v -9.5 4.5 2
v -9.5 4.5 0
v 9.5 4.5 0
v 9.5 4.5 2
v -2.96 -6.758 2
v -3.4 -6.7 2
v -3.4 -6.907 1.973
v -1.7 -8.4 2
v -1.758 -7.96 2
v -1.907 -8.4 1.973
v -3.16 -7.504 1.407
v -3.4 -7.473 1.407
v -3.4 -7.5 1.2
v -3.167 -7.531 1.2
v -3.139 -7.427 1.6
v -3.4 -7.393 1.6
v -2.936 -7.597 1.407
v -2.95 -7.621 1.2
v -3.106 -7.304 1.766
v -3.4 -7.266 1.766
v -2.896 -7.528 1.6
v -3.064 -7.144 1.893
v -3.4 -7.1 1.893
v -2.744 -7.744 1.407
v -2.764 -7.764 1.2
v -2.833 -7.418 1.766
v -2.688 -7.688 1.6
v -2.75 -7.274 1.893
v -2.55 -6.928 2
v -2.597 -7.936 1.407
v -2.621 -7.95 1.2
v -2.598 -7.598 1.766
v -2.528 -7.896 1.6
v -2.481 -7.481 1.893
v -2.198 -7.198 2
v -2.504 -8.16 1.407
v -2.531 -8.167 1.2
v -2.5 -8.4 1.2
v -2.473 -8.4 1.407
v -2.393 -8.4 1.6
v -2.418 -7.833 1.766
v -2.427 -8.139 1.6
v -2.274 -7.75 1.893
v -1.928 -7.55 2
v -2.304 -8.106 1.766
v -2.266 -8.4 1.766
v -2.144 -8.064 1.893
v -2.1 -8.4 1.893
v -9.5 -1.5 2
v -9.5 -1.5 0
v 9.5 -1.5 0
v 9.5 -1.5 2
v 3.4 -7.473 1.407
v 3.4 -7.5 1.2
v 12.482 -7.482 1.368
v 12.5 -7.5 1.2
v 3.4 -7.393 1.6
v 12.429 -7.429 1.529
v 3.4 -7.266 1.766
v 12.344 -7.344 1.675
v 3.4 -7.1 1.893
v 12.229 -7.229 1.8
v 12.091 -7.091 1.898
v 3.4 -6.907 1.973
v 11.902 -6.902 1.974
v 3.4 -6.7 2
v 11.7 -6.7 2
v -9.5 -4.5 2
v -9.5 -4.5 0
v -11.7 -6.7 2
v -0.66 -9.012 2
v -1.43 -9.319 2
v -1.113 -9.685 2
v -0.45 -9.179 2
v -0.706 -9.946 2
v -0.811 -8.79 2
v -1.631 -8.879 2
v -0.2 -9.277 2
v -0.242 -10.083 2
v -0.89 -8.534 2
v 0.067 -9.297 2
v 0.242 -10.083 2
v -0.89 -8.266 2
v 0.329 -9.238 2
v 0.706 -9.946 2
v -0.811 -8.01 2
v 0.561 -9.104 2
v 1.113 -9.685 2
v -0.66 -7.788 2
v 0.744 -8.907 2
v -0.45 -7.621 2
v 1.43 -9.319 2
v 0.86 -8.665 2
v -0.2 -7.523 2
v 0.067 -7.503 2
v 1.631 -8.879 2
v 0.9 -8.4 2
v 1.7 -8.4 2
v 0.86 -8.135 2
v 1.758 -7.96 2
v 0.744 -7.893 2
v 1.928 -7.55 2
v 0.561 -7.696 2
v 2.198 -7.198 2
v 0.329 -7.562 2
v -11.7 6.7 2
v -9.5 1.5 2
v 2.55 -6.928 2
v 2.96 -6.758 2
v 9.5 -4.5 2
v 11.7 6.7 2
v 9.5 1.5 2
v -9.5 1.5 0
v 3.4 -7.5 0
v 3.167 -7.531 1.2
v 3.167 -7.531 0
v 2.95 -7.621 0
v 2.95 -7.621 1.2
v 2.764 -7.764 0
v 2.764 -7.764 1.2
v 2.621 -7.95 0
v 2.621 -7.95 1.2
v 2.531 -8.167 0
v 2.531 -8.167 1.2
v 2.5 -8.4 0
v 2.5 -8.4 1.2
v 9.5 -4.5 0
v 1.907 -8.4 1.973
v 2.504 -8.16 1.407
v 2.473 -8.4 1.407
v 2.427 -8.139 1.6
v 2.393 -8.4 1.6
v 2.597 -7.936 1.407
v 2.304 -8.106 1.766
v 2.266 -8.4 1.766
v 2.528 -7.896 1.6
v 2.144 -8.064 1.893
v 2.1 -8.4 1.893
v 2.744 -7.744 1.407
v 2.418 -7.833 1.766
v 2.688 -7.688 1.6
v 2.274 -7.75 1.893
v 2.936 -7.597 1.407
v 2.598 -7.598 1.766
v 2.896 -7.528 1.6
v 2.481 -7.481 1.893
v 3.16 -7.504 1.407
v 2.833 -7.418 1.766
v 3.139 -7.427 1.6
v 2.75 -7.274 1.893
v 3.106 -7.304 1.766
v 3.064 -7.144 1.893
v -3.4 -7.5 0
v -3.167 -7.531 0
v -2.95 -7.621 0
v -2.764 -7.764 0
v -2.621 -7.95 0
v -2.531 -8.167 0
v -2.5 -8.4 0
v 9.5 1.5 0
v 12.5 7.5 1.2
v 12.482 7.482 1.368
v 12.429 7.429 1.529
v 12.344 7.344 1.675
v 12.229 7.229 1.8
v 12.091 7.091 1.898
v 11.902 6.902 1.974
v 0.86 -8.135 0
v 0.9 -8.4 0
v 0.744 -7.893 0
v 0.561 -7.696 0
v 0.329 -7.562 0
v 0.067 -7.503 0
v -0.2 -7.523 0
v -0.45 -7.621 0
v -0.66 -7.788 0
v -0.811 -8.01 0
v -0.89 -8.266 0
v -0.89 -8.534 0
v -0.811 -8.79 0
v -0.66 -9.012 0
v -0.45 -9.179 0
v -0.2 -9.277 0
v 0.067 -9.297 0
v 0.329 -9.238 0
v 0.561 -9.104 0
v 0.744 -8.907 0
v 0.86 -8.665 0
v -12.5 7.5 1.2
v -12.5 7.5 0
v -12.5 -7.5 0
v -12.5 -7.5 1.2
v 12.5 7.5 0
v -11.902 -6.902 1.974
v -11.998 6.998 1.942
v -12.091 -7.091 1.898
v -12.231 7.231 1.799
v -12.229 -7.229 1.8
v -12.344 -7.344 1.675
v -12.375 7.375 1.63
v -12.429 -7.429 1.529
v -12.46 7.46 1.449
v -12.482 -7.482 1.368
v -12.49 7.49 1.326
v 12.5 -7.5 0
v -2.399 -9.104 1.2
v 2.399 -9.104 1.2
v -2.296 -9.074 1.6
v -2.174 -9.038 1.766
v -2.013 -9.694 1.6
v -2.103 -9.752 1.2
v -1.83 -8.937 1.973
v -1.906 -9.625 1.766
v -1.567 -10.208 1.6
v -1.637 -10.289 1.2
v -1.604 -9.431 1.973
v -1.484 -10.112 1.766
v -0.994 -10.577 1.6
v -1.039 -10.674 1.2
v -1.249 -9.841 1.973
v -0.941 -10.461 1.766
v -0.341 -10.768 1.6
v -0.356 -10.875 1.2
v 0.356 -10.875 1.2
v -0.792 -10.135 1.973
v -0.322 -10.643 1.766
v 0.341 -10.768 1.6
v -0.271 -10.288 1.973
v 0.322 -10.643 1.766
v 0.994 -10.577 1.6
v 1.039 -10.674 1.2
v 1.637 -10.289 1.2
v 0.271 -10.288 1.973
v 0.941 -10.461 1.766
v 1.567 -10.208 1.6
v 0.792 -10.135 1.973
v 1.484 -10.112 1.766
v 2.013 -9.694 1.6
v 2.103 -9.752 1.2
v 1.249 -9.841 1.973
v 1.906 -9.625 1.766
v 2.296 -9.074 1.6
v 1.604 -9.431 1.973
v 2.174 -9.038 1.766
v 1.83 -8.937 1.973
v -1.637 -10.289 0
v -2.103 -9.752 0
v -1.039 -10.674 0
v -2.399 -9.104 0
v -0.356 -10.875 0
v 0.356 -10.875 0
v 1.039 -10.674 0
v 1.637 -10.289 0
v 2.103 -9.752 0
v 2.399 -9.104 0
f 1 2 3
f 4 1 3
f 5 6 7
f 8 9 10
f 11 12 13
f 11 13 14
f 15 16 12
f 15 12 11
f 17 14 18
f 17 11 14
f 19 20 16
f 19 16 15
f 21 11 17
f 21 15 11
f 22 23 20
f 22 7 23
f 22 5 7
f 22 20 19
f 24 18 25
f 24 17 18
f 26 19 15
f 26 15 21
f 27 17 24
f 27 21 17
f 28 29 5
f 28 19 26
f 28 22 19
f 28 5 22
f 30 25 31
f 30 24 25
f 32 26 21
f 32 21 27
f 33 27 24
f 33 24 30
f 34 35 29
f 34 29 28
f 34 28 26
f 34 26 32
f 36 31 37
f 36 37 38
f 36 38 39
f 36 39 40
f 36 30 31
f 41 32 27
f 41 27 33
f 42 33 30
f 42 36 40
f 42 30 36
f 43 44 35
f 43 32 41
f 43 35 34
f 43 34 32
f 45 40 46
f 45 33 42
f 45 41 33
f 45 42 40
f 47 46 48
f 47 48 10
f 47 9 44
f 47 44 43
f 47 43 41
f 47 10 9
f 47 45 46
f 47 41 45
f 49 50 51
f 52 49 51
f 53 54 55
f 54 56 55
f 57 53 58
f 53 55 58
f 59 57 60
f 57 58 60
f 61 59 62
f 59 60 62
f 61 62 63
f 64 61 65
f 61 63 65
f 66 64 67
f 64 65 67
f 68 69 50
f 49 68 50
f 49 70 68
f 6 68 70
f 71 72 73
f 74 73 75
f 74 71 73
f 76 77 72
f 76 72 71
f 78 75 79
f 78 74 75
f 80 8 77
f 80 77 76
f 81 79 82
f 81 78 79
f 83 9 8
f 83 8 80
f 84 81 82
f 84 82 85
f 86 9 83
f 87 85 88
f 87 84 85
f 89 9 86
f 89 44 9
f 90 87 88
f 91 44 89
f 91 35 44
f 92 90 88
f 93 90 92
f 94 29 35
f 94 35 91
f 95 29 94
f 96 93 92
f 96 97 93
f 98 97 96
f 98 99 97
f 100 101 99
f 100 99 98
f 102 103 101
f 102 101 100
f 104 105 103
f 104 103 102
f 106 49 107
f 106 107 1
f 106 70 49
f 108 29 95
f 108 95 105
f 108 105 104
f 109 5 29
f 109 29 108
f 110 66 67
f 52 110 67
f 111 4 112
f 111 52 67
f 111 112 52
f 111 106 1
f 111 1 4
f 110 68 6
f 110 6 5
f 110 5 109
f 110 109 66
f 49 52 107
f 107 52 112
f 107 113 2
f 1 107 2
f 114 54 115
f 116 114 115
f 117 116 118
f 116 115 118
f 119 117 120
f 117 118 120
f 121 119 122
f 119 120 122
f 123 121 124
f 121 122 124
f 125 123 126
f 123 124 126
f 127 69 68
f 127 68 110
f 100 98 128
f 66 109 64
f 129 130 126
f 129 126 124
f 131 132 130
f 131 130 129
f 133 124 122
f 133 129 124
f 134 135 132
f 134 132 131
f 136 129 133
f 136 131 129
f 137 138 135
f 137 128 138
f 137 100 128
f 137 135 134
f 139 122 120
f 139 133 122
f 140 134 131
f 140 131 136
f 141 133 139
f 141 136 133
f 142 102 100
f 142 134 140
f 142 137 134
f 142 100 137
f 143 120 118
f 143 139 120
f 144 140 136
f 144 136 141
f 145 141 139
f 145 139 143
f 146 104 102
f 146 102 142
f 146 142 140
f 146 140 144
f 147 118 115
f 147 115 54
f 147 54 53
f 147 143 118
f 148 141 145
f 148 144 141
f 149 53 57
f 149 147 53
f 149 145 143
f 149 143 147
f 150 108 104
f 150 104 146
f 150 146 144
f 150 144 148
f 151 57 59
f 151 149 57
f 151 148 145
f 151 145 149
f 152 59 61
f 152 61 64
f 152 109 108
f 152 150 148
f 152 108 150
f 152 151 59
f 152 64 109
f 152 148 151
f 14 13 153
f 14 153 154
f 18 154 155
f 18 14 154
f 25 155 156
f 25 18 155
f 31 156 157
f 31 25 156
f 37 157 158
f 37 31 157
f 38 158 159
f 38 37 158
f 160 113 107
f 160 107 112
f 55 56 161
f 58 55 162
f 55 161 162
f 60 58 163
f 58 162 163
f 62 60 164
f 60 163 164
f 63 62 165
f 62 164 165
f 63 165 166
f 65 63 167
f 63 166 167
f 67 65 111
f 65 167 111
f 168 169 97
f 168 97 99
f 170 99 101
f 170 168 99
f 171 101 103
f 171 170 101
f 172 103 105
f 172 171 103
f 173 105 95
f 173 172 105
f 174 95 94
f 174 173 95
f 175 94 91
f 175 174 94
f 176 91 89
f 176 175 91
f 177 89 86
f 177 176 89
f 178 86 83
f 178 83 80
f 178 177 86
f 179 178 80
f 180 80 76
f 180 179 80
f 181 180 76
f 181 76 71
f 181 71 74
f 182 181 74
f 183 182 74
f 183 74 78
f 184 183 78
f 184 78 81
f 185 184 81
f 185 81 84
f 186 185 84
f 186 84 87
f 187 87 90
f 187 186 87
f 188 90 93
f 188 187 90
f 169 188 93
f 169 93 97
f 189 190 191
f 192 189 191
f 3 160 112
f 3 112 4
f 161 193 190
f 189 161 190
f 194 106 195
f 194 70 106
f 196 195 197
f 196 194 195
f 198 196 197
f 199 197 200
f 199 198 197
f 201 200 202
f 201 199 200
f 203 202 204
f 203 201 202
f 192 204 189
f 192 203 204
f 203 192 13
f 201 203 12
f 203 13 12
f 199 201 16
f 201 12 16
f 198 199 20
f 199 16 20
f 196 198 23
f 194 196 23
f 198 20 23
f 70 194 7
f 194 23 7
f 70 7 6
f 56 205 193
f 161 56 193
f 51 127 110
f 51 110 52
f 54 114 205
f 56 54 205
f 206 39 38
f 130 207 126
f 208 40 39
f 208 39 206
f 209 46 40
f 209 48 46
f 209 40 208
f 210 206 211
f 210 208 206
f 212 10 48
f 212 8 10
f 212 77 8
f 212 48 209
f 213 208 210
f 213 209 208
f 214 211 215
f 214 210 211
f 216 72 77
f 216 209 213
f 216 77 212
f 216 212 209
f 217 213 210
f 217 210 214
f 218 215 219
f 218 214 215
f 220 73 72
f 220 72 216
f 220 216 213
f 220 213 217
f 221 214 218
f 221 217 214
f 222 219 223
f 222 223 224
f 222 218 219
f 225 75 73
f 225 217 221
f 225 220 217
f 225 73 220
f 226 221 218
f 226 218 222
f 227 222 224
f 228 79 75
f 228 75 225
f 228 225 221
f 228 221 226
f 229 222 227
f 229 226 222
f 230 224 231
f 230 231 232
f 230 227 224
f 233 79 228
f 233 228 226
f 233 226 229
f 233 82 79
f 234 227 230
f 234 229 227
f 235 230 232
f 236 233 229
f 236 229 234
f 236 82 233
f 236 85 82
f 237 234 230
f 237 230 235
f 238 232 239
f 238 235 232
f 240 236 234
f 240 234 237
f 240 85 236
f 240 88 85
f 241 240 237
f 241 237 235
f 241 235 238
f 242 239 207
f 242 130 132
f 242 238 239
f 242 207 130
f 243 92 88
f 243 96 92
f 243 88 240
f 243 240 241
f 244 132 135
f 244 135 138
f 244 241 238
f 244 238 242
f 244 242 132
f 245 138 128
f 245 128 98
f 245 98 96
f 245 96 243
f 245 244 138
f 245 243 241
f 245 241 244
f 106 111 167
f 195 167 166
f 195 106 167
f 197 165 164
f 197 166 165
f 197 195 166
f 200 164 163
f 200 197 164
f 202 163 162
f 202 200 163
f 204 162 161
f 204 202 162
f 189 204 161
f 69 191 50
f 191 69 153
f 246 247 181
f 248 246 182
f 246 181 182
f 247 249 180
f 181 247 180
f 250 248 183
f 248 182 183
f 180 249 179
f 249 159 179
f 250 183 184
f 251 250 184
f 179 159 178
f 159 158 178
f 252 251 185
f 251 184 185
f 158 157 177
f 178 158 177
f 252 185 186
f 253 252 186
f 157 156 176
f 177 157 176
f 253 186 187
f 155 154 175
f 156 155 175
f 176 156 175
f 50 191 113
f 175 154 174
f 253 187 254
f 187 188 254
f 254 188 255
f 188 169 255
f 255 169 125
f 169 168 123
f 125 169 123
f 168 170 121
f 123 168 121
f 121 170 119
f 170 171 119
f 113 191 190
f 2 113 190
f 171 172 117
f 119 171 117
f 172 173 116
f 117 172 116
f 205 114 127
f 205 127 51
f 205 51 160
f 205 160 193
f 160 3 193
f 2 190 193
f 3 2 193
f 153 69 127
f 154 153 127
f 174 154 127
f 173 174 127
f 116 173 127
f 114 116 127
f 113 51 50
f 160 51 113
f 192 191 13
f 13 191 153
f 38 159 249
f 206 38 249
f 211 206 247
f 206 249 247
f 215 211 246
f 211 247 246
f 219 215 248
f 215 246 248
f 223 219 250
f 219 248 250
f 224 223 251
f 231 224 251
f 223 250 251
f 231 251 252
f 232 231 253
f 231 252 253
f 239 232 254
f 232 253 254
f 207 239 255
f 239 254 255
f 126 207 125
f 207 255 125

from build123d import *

# Parameters (mm, degrees)
F0_R     = 0.9
F0_W     = 19
F0_H     = 3
F1_DEPTH = 2
F2_R     = 0.89999
F3_R     = 0.8


# Not quite as in the source:
# - a fillet or chamfer is up to 0.001 mm smaller than in the source, because OpenCascade refuses the exact size


with BuildPart() as f1:
    # F0 (on Top) → F1 (new body)
    with BuildSketch(Plane.XY):
        with BuildLine():
            Line((12.5, 7.5), (-12.5, 7.5))
            Line((-12.5, 7.5), (-12.5, -7.5))
            Line((-12.5, -7.5), (-2.5, -7.5))
            Line((-2.5, -7.5), (-2.5, -8.4))
            ThreePointArc((-2.5, -8.4), (0, -10.9), (2.5, -8.4))
            Line((2.5, -8.4), (2.5, -7.5))
            Line((2.5, -7.5), (12.5, -7.5))
            Line((12.5, -7.5), (12.5, 7.5))
        make_face()
        with Locations((0, -8.4)):
            Circle(F0_R, mode=Mode.SUBTRACT)
        with Locations((0, -3)):
            Rectangle(F0_W, F0_H, mode=Mode.SUBTRACT)
        with Locations((0, 3)):
            Rectangle(F0_W, F0_H, mode=Mode.SUBTRACT)
    extrude(amount=F1_DEPTH)

    # F2 (radius 0.9 in the source; OpenCascade refuses exactly that, so slightly less here)
    f2_edges = [f1.edges().sort_by_distance(p)[0] for p in [
        (2.5, -7.5, 1),
        (-2.5, -7.5, 1),
    ]]
    fillet(f2_edges, radius=F2_R)

    # F3
    f3_edges = [f1.edges().sort_by_distance(p)[0] for p in [
        (12.5, 0, 2),
        (7.949995, -7.5, 2),
        (-12.5, 0, 2),
        (0, 7.5, 2),
    ]]
    fillet(f3_edges, radius=F3_R)


solid = f1.part
